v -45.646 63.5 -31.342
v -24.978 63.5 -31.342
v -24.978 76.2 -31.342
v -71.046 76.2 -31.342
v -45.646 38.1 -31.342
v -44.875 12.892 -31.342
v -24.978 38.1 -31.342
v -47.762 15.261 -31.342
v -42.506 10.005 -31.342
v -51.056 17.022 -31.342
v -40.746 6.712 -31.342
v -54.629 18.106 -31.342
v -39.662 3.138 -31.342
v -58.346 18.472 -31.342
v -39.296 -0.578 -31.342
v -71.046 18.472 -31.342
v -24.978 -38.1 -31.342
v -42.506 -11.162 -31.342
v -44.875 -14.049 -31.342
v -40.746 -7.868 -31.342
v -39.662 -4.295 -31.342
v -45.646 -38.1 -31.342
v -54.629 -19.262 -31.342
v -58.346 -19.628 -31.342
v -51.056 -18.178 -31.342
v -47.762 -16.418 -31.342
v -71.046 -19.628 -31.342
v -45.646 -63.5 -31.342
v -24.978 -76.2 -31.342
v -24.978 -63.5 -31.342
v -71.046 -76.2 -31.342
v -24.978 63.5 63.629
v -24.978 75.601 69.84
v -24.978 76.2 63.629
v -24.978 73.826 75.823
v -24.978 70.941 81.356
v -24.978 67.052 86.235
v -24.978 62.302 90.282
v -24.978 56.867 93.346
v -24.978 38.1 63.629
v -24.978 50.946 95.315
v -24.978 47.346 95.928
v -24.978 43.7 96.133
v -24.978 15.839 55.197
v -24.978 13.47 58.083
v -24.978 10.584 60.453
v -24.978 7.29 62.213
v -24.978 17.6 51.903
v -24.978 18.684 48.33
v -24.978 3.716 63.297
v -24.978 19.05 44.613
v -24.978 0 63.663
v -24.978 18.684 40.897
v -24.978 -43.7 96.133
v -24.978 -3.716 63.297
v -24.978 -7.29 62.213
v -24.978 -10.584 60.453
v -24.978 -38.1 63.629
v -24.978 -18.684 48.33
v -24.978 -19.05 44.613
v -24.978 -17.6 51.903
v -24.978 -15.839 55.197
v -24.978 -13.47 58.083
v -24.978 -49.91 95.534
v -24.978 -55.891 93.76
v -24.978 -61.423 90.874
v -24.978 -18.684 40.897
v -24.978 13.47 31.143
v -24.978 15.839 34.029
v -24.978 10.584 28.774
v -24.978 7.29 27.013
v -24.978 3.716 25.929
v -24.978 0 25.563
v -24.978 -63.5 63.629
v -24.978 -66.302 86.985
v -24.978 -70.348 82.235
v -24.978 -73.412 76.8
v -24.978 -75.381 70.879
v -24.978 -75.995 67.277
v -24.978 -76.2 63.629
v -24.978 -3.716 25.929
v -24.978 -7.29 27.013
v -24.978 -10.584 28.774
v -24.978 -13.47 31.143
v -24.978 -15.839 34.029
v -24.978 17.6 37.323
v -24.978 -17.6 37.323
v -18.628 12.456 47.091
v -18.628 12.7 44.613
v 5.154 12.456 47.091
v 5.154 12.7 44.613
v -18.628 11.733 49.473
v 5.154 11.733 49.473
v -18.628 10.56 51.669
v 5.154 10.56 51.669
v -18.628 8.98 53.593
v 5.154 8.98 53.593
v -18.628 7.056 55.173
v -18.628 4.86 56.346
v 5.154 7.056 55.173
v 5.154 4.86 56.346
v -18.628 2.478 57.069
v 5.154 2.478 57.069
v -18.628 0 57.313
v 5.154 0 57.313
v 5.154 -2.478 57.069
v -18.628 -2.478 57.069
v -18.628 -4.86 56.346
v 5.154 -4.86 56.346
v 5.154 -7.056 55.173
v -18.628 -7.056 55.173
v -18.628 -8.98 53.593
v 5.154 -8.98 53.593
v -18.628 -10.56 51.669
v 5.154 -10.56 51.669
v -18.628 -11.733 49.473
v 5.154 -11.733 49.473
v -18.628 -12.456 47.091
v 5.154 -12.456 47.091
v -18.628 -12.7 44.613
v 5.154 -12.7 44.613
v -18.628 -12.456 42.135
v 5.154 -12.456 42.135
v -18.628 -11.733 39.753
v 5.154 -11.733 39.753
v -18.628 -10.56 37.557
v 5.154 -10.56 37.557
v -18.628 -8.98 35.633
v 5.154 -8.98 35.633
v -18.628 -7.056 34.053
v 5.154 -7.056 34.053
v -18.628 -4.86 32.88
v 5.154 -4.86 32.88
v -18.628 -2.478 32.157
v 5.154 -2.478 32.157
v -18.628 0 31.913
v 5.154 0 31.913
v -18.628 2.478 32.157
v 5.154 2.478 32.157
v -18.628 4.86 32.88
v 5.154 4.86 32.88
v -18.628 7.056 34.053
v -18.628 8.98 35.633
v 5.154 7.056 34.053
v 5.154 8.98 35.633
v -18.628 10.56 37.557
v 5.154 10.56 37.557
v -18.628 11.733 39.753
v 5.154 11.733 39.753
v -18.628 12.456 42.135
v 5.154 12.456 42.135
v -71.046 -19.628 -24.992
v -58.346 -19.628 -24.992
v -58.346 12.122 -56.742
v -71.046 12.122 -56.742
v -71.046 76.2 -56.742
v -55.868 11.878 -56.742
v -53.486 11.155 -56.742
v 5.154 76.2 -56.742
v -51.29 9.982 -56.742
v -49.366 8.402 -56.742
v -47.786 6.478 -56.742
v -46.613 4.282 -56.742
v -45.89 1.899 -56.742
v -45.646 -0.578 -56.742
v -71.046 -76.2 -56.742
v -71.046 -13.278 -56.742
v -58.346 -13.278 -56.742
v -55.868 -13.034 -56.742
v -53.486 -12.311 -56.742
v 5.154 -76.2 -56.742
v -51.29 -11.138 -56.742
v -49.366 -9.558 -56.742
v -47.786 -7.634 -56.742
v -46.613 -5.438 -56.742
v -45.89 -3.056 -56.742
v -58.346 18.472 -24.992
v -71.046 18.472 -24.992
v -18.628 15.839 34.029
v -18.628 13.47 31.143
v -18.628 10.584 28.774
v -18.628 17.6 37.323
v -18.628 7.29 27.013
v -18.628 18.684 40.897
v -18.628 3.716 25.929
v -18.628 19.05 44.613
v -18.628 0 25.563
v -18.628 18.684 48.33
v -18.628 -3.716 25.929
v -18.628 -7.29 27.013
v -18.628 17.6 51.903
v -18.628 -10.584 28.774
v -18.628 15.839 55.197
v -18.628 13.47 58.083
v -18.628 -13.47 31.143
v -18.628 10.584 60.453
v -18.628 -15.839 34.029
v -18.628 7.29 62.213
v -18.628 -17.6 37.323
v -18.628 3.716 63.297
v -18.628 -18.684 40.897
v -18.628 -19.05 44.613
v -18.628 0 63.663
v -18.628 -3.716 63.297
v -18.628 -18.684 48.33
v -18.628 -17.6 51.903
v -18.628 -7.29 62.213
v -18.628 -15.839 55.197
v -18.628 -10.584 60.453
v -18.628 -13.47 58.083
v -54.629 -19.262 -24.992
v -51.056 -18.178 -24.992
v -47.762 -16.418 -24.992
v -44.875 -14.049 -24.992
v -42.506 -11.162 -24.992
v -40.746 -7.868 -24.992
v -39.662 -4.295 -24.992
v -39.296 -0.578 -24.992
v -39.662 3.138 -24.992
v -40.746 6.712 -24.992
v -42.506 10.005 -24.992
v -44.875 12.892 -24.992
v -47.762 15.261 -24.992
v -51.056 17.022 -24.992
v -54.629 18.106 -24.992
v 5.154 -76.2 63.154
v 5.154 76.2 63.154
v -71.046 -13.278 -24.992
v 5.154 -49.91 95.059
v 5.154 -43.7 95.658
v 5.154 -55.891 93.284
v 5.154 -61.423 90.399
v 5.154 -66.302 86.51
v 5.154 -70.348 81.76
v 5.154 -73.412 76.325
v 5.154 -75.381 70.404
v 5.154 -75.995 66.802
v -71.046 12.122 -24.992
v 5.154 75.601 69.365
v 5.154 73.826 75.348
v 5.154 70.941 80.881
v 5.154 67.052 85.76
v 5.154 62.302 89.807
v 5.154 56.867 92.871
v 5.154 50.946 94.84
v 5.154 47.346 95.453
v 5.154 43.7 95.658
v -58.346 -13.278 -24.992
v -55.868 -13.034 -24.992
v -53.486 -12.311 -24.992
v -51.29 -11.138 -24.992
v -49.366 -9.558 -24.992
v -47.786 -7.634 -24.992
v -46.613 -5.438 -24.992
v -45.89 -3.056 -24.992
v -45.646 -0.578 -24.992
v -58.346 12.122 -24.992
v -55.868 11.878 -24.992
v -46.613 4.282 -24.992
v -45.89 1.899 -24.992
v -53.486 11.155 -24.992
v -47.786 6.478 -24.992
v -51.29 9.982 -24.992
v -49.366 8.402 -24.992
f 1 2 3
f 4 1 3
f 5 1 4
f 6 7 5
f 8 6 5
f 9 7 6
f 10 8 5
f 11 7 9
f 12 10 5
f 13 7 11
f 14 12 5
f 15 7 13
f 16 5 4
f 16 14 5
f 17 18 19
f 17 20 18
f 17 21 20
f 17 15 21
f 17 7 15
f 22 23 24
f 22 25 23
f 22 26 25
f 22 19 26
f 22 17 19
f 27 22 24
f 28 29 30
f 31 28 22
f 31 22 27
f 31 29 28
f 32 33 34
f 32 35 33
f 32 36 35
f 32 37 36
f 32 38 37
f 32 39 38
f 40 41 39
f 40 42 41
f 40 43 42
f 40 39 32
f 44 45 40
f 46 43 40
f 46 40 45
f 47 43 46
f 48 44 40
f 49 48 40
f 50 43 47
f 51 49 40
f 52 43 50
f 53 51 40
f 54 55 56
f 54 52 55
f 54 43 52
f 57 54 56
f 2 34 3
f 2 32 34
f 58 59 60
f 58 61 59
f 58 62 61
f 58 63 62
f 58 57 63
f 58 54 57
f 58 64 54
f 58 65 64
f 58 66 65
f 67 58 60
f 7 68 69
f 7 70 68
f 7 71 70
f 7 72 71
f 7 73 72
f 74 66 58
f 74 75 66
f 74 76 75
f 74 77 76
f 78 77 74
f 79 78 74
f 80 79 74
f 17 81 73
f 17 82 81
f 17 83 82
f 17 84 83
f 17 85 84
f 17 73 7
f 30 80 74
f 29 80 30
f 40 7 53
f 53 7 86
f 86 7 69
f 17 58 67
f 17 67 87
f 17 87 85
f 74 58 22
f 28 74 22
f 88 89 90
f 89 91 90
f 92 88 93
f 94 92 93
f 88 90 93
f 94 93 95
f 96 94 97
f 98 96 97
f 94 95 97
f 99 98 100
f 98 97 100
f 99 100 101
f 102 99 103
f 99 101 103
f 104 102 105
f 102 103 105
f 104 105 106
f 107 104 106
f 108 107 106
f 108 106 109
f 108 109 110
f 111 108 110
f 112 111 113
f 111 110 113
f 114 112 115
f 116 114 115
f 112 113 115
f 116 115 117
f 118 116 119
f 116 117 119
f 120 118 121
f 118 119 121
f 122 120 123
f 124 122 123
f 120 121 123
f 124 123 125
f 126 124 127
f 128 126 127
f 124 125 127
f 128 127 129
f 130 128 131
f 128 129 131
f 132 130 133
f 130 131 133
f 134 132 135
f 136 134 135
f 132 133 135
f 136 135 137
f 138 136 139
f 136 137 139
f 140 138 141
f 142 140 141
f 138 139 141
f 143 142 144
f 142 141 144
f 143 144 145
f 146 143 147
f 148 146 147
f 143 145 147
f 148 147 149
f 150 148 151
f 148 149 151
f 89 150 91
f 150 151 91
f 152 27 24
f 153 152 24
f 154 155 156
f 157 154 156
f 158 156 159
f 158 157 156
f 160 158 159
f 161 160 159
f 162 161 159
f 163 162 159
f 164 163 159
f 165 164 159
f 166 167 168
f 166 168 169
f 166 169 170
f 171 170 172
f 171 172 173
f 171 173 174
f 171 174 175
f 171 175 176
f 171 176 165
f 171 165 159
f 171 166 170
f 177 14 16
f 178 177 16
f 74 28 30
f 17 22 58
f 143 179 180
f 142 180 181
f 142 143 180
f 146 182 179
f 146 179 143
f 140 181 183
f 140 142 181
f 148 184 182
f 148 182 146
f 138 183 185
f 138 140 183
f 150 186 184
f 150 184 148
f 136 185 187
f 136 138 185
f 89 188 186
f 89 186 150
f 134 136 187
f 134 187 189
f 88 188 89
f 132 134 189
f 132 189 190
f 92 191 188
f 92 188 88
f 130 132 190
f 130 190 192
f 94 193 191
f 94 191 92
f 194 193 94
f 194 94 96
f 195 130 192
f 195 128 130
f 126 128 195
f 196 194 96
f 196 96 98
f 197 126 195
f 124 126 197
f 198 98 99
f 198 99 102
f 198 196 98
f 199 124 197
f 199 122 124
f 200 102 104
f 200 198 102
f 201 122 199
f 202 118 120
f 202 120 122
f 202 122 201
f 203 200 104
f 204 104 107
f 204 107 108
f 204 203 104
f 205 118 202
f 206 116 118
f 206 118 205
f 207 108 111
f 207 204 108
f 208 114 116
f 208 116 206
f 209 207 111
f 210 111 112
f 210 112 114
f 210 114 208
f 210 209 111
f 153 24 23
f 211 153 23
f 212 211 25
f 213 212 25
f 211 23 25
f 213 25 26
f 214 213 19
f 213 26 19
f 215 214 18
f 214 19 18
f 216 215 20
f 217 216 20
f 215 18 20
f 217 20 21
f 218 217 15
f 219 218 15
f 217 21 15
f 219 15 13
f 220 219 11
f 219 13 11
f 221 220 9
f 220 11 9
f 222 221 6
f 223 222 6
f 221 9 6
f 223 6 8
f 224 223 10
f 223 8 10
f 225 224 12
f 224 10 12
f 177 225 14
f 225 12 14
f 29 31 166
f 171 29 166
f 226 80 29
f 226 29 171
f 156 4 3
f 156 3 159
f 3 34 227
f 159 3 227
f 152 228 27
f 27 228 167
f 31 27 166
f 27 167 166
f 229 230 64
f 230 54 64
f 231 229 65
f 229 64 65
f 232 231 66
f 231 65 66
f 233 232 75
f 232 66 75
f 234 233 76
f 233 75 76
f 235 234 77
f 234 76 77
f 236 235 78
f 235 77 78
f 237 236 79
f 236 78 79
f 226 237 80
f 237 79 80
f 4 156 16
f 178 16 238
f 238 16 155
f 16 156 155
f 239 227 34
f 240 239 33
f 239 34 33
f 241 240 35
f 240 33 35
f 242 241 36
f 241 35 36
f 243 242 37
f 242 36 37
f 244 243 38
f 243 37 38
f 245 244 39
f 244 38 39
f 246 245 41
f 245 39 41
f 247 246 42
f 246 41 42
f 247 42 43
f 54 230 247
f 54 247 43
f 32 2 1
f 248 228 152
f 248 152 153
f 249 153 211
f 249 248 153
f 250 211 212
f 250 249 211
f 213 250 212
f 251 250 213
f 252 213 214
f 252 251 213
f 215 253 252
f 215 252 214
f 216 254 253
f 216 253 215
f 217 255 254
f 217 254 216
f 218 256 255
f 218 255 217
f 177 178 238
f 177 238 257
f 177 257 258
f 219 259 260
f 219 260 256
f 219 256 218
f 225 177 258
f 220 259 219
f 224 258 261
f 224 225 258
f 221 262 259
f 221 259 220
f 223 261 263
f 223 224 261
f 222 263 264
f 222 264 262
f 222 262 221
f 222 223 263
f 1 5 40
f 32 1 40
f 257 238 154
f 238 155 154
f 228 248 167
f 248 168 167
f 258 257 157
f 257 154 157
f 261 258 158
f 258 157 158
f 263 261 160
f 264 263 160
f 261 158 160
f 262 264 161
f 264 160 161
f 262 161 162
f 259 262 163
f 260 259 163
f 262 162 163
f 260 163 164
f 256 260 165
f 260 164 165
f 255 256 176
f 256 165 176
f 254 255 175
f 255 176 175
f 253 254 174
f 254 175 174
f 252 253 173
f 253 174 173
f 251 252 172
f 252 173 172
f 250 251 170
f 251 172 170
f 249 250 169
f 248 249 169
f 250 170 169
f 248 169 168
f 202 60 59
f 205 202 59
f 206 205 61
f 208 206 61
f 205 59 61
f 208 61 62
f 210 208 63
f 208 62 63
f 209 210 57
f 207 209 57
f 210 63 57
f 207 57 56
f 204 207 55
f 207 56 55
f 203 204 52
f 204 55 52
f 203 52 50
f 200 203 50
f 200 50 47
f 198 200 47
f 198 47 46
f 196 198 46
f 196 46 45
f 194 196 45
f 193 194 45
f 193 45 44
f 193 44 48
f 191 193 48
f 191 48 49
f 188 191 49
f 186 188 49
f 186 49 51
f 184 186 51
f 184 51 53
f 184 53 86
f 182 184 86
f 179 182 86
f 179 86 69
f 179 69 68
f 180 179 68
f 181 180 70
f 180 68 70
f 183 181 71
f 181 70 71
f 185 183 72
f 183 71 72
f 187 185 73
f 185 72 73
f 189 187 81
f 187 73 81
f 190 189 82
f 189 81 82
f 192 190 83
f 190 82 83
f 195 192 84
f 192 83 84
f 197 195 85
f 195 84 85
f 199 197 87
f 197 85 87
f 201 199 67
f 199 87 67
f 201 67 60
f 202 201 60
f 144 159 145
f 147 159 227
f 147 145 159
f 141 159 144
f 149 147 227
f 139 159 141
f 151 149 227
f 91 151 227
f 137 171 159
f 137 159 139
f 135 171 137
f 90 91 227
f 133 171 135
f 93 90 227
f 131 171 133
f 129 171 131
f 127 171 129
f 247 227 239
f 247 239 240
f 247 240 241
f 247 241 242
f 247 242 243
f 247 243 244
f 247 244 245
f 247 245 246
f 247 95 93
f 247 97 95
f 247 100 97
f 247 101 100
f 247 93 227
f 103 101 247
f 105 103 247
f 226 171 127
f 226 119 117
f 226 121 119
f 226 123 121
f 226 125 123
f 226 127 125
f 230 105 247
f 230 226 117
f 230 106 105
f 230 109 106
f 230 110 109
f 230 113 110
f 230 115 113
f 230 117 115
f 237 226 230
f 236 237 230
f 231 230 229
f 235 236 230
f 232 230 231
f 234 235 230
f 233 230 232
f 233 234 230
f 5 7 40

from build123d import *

# Parameters (mm, degrees)
F1_DEPTH       = 76.2
F3_DEPTH       = 25.4
F4_R           = 32.5001429767
F8_D           = 25.4
F8_CBORE_D     = 38.1
F8_CBORE_DEPTH = 6.35
F10_DEPTH      = 25.4
F12_DEPTH      = 25.4
F14_DEPTH      = 6.35


# Not quite as in the source:
# - a feature names something its author has since deleted; it is built from what else it names


with BuildPart() as f1:
    # F0 (on Front) → F1 (new body, symmetric)
    with BuildSketch(Plane.XZ):
        Polygon((5.1541254637, -56.7420329794), (5.1541254637, 95.6579670206), (-24.9778814614, 96.1331352592), (-24.9778814614, -31.3420329794), (-71.0458745363, -31.3420329794), (-71.0458745363, -56.7420329794), align=None)
    extrude(amount=F1_DEPTH, both=True)

    # F2 (on face) → F3 (cut)
    with BuildSketch(Plane.XY.offset(-31.3420329794)):
        with BuildLine():
            Line((-71.0458745363, 12.1218512269), (-71.0458745363, -13.2781487731))
            Line((-71.0458745363, -13.2781487731), (-58.3458745363, -13.2781487731))
            ThreePointArc((-58.3458745363, -13.2781487731), (-45.6458745363, -0.5781487731), (-58.3458745363, 12.1218512269))
            Line((-58.3458745363, 12.1218512269), (-71.0458745363, 12.1218512269))
        make_face()
    extrude(amount=-F3_DEPTH, mode=Mode.SUBTRACT)

    # F4
    f4_edges = [f1.edges().sort_by_distance(p)[0] for p in [
        (-9.911878, 76.2, 95.895551),
        (-9.911878, -76.2, 95.895551),
    ]]
    fillet(f4_edges, radius=F4_R)

    # F8 (through all)
    with Locations(Plane(origin=(-24.9778814614, 0, 0), x_dir=(0, -1, 0), z_dir=(-1, 0, 0))):
        with Locations((0, 44.6130335331)):
            CounterBoreHole(F8_D / 2, F8_CBORE_D / 2, F8_CBORE_DEPTH)

    # F9 (on face) → F10 (join)
    with BuildSketch(Plane.XZ.offset(38.1)):
        Polygon((-24.9547883868, -31.3420329794), (-24.9778814614, 63.6289514861), (-45.6458745363, -31.3420329794), align=None)
    extrude(amount=F10_DEPTH)

    # F11 (on face) → F12 (join)
    with BuildSketch(Plane(origin=(0, 38.1, 0), x_dir=(-1, 0, 0), z_dir=(0, 1, 0))):
        Polygon((45.6458745363, -31.3420329794), (24.9778814614, 63.6289514861), (24.9778814614, -31.3420329794), align=None)
    extrude(amount=F12_DEPTH)

    # F13 (on face) → F14 (join)
    with BuildSketch(Plane.XY.offset(-31.3420329794)):
        with BuildLine():
            Line((-71.0458745363, 18.4718512269), (-71.0458745363, 12.1218512269))
            Line((-71.0458745363, 12.1218512269), (-58.3458745363, 12.1218512269))
            ThreePointArc((-58.3458745363, 12.1218512269), (-45.6458745363, -0.5781487731), (-58.3458745363, -13.2781487731))
            Line((-58.3458745363, -13.2781487731), (-71.0458745363, -13.2781487731))
            Line((-71.0458745363, -13.2781487731), (-71.0458745363, -19.6281487731))
            Line((-71.0458745363, -19.6281487731), (-58.3458745363, -19.6281487731))
            ThreePointArc((-58.3458745363, -19.6281487731), (-39.2958745363, -0.5781487731), (-58.3458745363, 18.4718512269))
            Line((-58.3458745363, 18.4718512269), (-71.0458745363, 18.4718512269))
        make_face()
    extrude(amount=F14_DEPTH)


solid = f1.part
